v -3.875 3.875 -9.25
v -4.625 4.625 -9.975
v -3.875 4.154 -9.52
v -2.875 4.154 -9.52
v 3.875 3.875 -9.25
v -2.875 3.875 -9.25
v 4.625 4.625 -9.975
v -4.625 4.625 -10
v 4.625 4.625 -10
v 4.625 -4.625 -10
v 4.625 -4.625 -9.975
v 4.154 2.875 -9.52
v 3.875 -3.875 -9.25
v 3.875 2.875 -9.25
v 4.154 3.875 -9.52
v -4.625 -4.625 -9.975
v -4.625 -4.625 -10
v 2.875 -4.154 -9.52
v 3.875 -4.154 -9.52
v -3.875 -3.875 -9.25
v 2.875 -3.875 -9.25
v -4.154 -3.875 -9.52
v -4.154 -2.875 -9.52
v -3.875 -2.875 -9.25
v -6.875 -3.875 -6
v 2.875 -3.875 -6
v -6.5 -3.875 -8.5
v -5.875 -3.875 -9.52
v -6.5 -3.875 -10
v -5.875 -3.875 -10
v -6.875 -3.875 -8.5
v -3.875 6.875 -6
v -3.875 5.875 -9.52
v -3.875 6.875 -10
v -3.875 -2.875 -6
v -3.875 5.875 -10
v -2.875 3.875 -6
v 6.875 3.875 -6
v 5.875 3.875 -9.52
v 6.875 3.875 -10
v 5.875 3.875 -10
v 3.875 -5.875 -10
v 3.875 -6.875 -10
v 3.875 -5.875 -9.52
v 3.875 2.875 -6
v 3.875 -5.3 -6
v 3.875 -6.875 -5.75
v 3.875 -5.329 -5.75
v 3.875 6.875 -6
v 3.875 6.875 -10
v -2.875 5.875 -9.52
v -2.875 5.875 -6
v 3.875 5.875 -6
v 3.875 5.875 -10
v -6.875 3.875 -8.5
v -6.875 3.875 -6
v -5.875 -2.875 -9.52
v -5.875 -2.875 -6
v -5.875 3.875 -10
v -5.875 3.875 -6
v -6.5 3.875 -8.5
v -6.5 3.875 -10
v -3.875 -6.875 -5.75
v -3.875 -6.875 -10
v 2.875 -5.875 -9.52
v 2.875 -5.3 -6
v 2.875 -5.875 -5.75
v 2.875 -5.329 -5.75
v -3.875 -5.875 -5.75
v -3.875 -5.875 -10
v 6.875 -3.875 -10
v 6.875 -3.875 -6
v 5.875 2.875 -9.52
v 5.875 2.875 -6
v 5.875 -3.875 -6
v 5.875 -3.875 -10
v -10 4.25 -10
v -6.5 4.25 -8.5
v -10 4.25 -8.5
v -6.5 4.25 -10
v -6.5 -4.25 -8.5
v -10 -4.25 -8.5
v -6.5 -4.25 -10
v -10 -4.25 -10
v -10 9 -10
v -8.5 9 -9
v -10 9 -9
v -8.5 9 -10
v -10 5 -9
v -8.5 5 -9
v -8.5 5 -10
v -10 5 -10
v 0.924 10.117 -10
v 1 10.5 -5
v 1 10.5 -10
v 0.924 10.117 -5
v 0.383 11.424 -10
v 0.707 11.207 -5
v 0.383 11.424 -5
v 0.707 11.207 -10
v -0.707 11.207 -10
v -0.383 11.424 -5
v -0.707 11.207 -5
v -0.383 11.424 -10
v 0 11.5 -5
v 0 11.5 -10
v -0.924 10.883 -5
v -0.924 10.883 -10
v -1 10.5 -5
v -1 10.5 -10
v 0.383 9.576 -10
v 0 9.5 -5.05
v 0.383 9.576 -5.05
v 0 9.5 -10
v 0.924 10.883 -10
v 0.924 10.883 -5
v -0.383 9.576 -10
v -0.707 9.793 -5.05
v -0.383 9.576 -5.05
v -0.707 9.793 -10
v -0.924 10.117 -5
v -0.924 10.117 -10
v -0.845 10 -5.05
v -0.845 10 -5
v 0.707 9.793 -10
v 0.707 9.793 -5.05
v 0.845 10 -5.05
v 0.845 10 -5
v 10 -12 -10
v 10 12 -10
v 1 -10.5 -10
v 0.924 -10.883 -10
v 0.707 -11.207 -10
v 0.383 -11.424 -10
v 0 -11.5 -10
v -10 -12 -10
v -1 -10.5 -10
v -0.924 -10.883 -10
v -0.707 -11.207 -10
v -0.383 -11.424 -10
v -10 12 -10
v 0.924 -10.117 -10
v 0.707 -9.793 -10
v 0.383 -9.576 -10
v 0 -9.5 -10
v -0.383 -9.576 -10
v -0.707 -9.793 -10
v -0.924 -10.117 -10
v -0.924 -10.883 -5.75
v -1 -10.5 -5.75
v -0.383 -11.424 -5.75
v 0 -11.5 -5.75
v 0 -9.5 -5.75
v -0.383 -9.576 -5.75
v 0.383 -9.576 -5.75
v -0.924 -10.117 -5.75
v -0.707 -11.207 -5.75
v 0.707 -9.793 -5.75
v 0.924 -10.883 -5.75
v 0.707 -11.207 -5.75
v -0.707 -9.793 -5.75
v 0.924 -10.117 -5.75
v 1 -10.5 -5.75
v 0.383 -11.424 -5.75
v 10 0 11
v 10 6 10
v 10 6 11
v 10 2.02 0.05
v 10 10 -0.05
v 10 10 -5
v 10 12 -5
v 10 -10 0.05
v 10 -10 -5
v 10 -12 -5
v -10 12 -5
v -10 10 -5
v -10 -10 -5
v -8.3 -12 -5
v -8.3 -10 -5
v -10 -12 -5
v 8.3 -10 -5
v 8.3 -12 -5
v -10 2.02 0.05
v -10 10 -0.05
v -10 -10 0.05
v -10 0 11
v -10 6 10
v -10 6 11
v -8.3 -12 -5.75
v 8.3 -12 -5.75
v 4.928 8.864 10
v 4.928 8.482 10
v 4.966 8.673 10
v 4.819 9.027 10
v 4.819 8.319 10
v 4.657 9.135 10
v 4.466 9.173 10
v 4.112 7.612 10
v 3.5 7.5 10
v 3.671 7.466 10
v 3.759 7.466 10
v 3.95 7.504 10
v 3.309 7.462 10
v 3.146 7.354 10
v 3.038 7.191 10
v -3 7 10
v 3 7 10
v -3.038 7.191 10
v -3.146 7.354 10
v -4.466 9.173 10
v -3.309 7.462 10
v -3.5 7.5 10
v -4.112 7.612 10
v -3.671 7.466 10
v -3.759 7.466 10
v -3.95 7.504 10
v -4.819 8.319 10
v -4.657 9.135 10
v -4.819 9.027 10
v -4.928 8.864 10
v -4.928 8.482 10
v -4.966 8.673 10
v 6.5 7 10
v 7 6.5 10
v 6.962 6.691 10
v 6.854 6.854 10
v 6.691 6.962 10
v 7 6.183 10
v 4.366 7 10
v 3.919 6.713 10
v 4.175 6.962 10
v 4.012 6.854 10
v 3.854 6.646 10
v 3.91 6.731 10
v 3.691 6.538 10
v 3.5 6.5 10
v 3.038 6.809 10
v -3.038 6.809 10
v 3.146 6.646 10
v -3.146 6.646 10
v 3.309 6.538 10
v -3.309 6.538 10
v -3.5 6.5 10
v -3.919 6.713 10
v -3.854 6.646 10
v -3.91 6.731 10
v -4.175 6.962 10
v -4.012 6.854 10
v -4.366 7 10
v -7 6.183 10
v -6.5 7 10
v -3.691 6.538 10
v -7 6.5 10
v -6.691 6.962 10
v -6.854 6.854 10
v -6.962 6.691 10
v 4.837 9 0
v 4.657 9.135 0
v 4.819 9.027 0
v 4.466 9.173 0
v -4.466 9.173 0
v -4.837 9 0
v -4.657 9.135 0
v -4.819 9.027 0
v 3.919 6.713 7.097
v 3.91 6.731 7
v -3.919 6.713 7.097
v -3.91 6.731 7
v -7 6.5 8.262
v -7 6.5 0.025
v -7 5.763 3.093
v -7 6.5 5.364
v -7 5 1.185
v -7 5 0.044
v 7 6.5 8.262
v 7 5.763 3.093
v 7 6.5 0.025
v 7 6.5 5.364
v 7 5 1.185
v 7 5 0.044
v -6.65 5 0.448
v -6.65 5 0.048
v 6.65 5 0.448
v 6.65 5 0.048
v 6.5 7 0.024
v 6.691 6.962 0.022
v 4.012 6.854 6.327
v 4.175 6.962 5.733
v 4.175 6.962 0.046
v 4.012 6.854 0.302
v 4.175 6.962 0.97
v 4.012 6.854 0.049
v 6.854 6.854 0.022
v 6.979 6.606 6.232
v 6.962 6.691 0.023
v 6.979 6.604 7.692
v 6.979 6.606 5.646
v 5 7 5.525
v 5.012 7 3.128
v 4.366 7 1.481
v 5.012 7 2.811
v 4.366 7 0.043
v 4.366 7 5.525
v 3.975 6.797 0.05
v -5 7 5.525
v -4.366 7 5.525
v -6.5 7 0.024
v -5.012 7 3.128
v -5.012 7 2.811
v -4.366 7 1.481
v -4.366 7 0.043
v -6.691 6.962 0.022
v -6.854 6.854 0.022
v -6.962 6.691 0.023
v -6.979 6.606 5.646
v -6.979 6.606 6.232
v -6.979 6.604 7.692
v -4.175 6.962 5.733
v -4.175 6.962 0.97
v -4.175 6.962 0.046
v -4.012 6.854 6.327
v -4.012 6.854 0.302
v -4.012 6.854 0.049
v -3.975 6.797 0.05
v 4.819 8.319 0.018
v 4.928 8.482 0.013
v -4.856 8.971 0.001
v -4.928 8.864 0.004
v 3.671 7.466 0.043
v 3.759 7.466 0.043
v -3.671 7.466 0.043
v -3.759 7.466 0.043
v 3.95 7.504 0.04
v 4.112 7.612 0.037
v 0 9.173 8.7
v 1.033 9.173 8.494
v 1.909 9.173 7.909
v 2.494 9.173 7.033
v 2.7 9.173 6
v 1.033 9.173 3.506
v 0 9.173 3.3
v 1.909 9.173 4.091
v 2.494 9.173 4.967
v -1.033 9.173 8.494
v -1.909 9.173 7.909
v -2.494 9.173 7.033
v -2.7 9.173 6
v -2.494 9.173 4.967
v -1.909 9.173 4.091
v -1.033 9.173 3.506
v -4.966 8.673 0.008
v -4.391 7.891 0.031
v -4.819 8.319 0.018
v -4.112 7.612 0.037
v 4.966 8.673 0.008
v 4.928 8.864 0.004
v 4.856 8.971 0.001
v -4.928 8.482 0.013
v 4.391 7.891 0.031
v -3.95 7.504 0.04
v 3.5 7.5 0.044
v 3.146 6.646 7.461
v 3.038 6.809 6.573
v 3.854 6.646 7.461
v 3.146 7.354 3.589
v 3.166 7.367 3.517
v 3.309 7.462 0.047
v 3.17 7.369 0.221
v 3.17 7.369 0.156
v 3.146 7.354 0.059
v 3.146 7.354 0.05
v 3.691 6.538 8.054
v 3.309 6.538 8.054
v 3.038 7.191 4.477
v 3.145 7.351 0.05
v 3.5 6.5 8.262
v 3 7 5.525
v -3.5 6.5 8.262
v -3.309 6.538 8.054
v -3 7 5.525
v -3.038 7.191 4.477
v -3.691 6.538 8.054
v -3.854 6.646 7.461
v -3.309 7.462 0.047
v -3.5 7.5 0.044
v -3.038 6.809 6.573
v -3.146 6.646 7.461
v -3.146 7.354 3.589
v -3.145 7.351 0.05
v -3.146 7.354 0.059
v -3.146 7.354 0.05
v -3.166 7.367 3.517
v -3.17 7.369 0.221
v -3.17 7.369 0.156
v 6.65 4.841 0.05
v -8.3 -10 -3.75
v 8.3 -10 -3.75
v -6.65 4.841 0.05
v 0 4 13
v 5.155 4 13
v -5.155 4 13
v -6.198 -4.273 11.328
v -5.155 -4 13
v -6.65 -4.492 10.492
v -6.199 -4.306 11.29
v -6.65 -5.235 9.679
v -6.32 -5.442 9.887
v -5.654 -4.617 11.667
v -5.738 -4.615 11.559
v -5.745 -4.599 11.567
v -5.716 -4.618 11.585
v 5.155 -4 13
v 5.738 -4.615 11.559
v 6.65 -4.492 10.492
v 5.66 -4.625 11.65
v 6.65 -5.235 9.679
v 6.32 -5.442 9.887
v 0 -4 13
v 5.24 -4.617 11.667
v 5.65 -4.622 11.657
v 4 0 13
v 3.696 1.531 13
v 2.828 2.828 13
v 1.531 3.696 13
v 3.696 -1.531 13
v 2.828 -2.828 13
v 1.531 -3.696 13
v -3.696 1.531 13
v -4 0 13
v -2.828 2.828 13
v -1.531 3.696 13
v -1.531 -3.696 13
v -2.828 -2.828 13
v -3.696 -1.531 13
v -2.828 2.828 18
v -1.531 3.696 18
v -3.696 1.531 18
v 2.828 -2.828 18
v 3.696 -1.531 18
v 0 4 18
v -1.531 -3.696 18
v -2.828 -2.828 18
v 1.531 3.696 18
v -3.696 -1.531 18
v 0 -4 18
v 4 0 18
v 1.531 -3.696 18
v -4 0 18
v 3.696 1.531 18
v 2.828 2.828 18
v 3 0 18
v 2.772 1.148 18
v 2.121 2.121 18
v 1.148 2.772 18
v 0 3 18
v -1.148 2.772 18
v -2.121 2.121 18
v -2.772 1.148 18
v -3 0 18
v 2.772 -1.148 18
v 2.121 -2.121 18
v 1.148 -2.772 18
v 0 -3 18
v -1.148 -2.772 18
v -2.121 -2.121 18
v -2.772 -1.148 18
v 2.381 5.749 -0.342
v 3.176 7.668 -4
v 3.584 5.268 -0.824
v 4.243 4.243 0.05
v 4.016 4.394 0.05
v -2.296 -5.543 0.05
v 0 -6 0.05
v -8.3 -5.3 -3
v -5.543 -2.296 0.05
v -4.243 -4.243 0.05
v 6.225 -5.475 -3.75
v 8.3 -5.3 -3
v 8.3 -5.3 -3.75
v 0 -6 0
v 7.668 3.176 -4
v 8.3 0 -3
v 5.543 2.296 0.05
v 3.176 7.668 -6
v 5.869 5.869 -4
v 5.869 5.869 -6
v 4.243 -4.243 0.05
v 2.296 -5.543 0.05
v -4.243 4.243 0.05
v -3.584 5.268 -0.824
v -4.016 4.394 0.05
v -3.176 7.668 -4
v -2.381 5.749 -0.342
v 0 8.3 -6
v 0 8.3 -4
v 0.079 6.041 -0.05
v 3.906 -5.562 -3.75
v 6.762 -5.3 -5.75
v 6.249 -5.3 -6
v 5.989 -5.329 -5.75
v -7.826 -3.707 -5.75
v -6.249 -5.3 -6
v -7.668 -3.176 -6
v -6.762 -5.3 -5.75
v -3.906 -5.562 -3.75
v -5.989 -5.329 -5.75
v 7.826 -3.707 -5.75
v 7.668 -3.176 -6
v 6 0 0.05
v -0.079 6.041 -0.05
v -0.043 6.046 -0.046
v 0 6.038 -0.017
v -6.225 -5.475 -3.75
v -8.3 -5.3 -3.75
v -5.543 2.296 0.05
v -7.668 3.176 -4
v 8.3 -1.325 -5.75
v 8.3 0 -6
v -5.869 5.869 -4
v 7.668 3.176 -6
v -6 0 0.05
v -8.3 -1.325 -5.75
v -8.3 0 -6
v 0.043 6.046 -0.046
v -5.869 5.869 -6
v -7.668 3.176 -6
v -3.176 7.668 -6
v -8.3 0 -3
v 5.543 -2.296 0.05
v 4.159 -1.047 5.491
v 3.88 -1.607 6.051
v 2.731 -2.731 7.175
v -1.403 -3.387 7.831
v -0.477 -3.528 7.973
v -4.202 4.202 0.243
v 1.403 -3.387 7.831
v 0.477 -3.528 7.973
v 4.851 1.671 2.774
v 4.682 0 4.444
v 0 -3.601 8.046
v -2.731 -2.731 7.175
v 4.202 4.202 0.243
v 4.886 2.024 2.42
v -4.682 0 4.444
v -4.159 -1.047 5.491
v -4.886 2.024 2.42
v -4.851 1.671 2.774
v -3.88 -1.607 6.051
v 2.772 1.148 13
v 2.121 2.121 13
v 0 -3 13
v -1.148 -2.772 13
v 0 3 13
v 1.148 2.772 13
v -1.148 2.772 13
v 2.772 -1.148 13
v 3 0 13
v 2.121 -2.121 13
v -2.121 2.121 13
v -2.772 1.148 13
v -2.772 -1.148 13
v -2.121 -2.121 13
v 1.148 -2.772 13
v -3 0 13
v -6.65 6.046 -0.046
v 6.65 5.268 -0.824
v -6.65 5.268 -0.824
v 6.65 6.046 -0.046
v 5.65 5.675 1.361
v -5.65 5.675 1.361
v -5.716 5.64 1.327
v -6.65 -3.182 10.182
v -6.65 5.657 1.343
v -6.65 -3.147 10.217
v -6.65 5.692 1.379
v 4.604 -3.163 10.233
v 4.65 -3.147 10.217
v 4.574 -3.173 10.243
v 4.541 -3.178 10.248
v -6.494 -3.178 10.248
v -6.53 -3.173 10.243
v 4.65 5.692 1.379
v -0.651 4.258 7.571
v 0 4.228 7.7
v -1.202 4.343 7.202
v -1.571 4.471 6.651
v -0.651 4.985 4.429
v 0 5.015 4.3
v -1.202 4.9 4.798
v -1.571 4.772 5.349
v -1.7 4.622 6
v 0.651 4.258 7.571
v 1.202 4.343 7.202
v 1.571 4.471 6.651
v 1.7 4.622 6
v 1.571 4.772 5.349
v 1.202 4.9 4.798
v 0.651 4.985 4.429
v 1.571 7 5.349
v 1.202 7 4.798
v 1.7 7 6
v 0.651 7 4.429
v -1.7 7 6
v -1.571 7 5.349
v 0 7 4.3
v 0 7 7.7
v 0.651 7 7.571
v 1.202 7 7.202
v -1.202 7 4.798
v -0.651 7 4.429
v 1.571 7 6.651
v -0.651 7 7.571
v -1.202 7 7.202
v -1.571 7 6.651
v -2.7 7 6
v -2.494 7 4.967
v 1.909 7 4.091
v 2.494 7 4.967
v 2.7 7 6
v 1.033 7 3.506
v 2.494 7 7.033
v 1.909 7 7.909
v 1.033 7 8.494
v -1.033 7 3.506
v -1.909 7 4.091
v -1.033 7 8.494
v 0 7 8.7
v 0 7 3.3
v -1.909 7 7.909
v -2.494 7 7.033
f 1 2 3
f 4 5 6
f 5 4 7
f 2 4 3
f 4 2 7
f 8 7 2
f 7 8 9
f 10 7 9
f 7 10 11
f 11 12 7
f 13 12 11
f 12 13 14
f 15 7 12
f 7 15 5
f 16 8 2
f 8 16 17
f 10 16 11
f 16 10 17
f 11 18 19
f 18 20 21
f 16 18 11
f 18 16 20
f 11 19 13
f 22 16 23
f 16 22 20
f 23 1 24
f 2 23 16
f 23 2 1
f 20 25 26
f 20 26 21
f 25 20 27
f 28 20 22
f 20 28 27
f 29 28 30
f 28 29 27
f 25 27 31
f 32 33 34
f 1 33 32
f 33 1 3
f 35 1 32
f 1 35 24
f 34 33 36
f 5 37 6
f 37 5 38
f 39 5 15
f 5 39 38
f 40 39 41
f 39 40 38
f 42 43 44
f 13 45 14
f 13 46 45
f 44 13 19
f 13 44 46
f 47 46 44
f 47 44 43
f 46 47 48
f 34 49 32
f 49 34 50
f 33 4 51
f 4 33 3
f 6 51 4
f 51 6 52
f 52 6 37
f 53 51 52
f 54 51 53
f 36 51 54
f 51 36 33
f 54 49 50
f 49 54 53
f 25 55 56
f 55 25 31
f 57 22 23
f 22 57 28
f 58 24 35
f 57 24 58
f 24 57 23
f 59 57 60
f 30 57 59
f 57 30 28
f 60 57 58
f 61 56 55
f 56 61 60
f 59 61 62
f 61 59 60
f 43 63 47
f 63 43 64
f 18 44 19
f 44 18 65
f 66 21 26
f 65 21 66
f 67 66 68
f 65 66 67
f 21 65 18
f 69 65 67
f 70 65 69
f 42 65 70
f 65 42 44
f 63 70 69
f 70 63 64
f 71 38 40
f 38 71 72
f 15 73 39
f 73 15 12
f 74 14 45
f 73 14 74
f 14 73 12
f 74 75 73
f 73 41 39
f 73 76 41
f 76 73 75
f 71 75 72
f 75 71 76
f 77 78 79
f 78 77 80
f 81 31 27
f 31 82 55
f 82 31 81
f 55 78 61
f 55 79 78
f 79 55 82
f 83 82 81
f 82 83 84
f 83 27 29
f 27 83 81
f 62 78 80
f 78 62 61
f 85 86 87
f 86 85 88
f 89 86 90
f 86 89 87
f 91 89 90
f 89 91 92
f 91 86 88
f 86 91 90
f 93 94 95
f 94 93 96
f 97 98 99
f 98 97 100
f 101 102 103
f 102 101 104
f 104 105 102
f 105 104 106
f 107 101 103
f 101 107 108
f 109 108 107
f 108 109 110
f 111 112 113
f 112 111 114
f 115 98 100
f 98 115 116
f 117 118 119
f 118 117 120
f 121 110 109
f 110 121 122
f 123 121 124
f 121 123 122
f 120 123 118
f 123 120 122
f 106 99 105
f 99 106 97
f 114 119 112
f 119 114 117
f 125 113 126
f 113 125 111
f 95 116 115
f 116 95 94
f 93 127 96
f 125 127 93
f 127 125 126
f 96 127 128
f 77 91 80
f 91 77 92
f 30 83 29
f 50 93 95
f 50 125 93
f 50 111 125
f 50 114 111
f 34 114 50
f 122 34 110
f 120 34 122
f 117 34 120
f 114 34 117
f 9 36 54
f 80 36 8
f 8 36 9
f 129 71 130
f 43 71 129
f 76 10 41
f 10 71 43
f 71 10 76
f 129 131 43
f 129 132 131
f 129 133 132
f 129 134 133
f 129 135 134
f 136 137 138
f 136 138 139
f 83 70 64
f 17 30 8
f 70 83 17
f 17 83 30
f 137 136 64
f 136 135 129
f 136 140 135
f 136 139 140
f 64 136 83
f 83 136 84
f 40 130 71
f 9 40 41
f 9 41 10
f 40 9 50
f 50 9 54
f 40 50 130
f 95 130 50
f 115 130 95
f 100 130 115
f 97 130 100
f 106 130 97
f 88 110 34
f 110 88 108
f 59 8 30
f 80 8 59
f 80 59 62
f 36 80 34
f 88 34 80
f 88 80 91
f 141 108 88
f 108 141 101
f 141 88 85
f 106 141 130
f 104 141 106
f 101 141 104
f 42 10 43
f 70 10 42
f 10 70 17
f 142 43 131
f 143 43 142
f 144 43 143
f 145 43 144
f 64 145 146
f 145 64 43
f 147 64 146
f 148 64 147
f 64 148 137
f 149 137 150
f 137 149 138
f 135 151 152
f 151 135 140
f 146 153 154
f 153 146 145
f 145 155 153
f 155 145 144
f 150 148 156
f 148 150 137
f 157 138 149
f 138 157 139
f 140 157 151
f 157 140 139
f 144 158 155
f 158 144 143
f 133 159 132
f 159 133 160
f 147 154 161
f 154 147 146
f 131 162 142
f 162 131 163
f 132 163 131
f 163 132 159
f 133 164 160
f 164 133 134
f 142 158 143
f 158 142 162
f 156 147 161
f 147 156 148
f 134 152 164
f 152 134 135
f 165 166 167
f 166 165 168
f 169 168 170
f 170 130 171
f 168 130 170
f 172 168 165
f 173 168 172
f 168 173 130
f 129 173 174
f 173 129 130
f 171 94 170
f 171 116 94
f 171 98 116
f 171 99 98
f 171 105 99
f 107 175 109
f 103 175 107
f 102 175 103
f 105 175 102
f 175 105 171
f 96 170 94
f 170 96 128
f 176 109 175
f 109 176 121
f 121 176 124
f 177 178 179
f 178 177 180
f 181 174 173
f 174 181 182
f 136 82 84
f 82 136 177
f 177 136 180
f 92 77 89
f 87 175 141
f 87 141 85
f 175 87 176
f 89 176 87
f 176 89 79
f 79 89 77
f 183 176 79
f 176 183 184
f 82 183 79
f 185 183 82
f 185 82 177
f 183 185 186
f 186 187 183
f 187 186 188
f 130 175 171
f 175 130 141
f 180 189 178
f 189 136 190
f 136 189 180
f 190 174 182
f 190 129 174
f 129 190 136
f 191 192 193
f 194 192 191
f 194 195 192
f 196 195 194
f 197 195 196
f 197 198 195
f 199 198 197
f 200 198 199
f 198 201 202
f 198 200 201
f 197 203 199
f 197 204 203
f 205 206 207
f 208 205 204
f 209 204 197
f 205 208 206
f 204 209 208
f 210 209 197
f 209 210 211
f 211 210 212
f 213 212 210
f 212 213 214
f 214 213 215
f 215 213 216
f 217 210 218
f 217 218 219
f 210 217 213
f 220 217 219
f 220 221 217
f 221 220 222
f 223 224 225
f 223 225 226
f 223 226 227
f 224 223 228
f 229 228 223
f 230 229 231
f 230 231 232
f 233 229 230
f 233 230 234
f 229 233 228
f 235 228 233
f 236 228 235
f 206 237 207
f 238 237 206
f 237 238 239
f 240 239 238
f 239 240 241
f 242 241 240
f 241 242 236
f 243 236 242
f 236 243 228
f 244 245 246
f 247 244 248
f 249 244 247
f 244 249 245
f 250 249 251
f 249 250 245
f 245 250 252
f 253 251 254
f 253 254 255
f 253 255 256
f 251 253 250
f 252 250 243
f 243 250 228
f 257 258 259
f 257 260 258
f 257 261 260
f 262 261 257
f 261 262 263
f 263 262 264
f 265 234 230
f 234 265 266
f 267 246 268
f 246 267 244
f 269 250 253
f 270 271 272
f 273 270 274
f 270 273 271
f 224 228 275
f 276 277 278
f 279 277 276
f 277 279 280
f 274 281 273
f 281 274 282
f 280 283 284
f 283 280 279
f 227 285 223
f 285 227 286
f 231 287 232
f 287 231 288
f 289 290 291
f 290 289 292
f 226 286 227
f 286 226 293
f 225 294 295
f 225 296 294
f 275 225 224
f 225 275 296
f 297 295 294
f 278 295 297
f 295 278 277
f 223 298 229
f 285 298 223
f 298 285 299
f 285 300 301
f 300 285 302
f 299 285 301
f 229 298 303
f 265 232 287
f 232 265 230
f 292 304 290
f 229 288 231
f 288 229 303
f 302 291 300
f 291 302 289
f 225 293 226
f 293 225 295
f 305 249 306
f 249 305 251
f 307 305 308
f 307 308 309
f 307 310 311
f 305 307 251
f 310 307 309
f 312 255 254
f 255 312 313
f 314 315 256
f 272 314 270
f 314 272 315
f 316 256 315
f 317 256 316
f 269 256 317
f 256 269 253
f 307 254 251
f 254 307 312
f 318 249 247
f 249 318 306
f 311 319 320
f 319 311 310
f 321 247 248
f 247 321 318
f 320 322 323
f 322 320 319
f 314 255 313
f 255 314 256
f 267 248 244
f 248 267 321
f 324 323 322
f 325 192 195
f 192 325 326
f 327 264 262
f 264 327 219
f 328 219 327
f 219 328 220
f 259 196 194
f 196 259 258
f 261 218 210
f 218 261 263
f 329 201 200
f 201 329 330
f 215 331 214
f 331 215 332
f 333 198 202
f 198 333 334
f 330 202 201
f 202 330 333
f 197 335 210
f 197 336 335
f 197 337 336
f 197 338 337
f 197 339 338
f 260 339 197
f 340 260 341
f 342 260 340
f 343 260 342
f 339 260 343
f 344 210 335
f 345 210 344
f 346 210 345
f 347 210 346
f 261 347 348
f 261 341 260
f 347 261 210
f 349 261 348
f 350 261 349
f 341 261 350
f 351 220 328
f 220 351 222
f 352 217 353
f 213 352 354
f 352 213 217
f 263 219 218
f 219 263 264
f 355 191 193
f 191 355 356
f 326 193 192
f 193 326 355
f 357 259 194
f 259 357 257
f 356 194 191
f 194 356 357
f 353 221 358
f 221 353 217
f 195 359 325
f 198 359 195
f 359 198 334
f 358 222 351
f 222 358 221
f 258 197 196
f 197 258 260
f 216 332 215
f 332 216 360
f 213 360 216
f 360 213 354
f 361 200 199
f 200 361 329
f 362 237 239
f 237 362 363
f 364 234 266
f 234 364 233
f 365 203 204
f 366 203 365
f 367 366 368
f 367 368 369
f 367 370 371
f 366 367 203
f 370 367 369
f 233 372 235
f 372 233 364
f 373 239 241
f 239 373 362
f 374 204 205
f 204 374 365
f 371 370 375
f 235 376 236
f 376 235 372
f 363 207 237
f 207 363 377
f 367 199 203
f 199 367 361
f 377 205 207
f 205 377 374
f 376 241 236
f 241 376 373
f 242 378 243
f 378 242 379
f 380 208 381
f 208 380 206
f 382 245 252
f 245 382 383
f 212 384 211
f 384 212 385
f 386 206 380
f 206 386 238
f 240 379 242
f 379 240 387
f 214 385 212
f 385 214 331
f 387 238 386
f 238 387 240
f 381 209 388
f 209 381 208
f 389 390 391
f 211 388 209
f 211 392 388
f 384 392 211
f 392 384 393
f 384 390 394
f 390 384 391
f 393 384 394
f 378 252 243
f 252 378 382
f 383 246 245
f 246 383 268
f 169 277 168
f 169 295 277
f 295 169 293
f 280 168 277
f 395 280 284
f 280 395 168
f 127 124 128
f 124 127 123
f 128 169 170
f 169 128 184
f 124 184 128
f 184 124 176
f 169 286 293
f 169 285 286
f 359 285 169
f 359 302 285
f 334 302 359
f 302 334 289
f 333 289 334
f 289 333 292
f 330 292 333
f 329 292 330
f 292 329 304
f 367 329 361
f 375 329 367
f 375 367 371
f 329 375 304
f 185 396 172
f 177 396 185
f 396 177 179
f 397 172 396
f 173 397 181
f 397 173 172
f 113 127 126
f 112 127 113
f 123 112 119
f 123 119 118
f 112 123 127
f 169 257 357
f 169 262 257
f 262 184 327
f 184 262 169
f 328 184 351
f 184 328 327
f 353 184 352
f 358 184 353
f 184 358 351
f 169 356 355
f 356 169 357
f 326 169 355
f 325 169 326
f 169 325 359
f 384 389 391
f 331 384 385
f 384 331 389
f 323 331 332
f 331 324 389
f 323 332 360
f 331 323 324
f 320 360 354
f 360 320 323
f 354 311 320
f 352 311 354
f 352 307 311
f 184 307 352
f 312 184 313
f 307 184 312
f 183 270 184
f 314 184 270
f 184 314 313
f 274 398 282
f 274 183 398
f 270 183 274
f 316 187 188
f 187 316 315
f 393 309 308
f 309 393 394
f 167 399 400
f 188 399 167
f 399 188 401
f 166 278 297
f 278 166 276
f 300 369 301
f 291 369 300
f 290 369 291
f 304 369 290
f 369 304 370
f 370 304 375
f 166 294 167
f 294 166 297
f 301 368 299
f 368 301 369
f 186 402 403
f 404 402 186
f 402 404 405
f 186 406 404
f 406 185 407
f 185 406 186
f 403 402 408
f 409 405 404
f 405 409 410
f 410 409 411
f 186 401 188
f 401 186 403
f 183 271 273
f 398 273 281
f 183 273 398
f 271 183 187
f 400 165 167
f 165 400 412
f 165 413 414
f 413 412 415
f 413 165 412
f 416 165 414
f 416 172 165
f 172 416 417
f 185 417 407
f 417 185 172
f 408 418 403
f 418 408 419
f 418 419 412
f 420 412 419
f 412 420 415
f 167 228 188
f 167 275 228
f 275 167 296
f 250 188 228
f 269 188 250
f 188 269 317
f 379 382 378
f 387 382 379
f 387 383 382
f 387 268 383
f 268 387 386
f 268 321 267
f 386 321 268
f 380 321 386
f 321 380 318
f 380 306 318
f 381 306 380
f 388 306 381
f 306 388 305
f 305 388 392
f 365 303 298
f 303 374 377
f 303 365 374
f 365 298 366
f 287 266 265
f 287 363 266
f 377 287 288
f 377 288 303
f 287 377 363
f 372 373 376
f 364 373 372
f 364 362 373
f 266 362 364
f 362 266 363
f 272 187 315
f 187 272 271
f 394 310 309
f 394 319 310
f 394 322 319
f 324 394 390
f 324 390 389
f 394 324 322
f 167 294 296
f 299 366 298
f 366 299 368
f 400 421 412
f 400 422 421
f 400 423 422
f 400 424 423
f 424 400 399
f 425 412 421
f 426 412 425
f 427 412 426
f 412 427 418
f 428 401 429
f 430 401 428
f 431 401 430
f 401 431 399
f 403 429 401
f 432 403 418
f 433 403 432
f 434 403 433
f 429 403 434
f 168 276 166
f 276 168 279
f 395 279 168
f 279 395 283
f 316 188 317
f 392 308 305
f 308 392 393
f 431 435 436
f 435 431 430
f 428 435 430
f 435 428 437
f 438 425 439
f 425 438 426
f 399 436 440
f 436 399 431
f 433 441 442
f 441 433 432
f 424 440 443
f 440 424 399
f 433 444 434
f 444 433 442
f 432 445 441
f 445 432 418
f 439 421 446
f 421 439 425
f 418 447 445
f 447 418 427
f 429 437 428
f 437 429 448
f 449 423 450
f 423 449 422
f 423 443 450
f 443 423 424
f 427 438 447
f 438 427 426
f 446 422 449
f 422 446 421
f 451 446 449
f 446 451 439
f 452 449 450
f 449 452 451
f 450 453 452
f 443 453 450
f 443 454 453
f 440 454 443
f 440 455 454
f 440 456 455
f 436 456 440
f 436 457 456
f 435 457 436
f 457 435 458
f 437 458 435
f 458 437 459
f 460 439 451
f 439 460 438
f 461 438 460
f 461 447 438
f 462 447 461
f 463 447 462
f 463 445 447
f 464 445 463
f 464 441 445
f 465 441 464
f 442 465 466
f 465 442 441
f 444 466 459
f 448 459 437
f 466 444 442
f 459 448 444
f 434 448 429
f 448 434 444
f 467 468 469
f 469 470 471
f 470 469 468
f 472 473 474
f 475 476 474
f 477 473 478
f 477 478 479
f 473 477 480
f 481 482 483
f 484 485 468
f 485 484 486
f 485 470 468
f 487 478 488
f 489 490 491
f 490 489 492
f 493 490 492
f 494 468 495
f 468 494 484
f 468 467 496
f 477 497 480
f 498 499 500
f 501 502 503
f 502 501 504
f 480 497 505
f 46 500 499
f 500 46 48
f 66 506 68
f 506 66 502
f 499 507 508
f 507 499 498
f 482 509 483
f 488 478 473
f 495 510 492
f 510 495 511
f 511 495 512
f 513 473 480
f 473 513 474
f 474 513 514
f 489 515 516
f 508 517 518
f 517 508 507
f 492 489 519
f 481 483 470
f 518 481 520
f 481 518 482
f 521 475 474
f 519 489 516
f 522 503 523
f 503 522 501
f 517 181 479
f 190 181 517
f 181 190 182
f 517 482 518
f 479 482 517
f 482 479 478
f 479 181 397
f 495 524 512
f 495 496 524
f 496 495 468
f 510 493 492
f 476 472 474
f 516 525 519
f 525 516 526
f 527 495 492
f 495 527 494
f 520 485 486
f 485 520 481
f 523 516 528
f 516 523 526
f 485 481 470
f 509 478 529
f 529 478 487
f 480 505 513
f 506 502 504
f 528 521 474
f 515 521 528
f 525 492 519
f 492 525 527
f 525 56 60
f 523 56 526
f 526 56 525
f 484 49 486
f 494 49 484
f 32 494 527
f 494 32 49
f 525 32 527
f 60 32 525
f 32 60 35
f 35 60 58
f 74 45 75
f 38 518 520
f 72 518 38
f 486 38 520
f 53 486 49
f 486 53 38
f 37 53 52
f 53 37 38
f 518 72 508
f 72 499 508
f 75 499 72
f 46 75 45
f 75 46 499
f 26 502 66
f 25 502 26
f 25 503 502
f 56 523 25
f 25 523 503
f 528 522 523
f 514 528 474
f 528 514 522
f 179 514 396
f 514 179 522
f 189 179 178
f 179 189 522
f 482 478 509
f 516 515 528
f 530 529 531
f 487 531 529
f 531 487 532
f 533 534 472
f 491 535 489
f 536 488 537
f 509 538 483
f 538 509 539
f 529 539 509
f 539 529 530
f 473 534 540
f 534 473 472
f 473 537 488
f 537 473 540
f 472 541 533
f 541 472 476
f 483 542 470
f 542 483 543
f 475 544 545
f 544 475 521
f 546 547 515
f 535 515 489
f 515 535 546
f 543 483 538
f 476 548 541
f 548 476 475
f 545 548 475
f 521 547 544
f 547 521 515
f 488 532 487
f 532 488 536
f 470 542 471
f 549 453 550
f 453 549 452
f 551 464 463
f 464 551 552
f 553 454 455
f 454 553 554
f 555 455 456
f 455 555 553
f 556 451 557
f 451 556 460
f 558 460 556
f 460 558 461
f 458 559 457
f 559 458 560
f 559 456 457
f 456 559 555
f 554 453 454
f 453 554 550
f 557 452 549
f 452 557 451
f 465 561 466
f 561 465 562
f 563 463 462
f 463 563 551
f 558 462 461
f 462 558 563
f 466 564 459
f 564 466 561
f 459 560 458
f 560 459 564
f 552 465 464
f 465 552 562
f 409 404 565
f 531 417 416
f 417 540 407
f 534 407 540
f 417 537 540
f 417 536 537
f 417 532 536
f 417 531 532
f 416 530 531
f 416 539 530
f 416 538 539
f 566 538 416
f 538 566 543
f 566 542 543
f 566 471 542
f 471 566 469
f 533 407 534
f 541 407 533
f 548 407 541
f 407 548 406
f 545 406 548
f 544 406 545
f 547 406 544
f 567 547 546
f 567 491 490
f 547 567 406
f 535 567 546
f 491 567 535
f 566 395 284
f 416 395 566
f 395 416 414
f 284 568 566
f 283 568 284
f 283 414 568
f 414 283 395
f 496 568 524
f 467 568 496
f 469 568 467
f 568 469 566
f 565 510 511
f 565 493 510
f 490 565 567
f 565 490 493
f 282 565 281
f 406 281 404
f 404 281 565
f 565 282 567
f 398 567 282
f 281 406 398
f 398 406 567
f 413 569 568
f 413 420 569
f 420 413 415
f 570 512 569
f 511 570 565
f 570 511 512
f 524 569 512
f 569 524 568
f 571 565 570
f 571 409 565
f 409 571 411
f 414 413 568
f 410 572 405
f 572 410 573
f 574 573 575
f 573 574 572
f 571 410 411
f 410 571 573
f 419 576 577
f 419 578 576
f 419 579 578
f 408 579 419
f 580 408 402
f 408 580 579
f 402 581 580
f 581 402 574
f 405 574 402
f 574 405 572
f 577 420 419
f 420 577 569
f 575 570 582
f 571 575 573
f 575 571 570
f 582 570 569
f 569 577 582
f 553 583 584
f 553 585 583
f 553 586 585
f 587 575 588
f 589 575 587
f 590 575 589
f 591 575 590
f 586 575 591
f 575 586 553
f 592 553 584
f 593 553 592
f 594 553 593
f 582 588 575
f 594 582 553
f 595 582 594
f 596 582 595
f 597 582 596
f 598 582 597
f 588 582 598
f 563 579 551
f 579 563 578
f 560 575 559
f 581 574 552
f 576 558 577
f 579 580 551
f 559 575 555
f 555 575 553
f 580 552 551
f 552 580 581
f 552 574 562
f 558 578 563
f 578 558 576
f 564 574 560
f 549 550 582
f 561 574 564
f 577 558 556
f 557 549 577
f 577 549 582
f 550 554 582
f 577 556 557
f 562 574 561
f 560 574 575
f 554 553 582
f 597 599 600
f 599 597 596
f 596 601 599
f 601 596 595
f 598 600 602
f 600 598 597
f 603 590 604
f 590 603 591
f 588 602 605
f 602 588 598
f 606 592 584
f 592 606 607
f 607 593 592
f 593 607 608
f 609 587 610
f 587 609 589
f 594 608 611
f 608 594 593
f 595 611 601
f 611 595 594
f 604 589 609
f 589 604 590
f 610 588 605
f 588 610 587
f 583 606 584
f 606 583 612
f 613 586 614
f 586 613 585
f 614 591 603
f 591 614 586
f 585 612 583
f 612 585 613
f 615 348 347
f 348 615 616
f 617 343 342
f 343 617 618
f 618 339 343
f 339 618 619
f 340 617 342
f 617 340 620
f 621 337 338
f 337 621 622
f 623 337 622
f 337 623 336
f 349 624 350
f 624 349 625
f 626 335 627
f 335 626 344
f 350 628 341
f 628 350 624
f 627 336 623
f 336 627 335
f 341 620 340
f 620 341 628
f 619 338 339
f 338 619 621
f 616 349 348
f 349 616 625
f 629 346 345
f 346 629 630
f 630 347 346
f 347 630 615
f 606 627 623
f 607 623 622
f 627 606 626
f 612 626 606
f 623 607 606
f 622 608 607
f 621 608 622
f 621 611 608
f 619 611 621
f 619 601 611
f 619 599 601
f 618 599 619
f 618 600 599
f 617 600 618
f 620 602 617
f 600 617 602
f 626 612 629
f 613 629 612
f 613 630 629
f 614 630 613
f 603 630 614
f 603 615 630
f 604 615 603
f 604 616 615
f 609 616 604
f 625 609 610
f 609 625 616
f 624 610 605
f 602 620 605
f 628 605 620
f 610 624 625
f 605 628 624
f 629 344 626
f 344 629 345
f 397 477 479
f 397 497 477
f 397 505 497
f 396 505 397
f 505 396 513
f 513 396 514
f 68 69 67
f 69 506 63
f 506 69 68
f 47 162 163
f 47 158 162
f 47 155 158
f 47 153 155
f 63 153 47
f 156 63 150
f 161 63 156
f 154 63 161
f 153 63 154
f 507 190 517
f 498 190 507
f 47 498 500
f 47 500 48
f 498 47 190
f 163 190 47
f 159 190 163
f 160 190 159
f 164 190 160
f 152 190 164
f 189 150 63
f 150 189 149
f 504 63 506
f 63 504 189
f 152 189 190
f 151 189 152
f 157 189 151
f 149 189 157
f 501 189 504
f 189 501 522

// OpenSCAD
// file: picam_push_fit.scad
use <utilities.scad>;


//outer_r=8.5;   //square side length
//f=0.5; //feather amount
d=0.05; //small distance!


module camera_bits(){
	union(){
		translate([0,6.5+5,0]) cube([8.5,10,3],center=true);
		translate([7,10,0]) cube([4,3,2],center=true);
	}
}

module picam_push_fit(){
    // This uses four slightly flexible fingers to grip the
    // camera module.  It's designed to be subtracted from a
    // larger shape, and needs space above it.
    // it's often a bit too stiff, and tends to rotate the
    // camera slightly.  v2 is better (see below).
	assign(r=8-0.25) //un-flexed side length of camera box
	assign(finger_w=2) //width of flexure "fingers"
	assign(chamfer=0.75) //How much to shrink the bottom layer
	union(){
		//very tight cut-out for camera
		sequential_hull(){
			cube([r+chamfer*2,r+chamfer*2,d],center=true);
			cube([r,r,chamfer*2],center=true);
			cube([r,r,40],center=true);
		}
		for(a=[0:90:360]) rotate(a){
			translate([0,r/2-1,0.48]) cube([r/2+finger_w+1,1,20]);
			translate([r/2+finger_w,-r/2,-d]) cube([1,r,20]);
		}
		camera_bits();

		//screw holes for safety (M2 "threaded")
		reflect([1,0,0]) translate([21/2,0,0]) cylinder(r=1,h=10);
	}
}



module picam_push_fit_2( beam_length=15){
    // This module is designed to be subtracted from the bottom of a shape.
    // The z=0 plane should be the print bed.
    // It includes cut-outs for the components on the PCB and also a push-fit hole
    // for the camera module.  This uses flexible "fingers" to grip the camera firmly
    // but gently.  Just push to insert, and wiggle to remove.  You may find popping 
    // off the brown ribbon cable and removing the PCB first helps when extracting
    // the camera module again.
    camera = [8,8,3]; //size of camera box
	cw = camera[0]+1; //side length of camera box at bottom (slightly larger)
	finger_w = 1.5; //width of flexure "fingers"
	flex_l = 1; //width of flexible part
    hole_r = camera[0]/2-0.5;
	union(){
		//cut-out for camera
        hull(){
            translate([0,0,-d]) cube([cw+0.5,cw+0.5,d],center=true); //hole for camera
            translate([0,0,1]) cube([cw-0.5,cw-0.5,d],center=true); //hole for camera
        }
        rotate(180/16) cylinder(r=hole_r,h=20,center=true,$fn=16); //hole for light
        
        //looser cut-out for camera, with gripping "fingers" on 3 sides
        difference(){
            //cut-out big enough to include gripping fingers
            intersection(){
                translate([-cw/2-finger_w-flex_l,-cw/2-finger_w-flex_l,0.5])
                    cube([cw+2*finger_w+2*flex_l,
                        cw+finger_w+flex_l,
                        999]);
                //build up the roof gradually so we get a nice hole
                rotate(90) translate([0,0,camera[2]+1.5]) hole_from_bottom(r=hole_r,base_w=cw+2*finger_w+2*flex_l,h=beam_length - camera[2]-1.5);
            }
                
            //gripping "fingers" (NB we subtract these from the cut-out)
            for(a=[90:90:270]) rotate(a) hull(){
                translate([-cw/2+0.5,cw/2,0]) cube([cw-1,finger_w,d]);
                translate([-cw/2+1,camera[0]/2-0.1,camera[2]]) cube([cw-2,finger_w,d]);
            }
            //there's no finger on the top, so add a dimple on the fourth side
            hull(){
                translate([-cw/2+1,cw/2,2]) cube([cw-2,d,camera[2]-2]);
                translate([-cw/2+2,camera[1]/2,camera[2]-0.5]) cube([cw-4,d,0.5]);
            }
		}
        
		//ribbon cable at top of camera
        translate([0,(9.5+5)/2+cw/2-d,0]) cube([cw,9.5+5,4],center=true);
        //resistor/LED
		translate([7,10,0]) cube([4+2,3,2],center=true);
        translate([7+1,8.5,0.3]) cube([1,13,1]); //channel so we can see the LED
                //NB the LED channel is deliberately high to aid adhesion

		//screw holes for safety (M2 "threaded")
		reflect([1,0,0]) translate([21/2,0,0]) cylinder(r=1,h=10,center=true);
	}
}

//difference(){
//    translate([-12.5,-12+2.4,0]) cube([25,24,6]);
//    picam_push_fit_2();
//}

module picam_pcb_bottom(){
    // This is an approximate model of the pi camera PCB for the purposes of making
    // a slide-on cover.  NB z=0 is the bottom of the PCB, which is nominally 1mm thick.
    pcb = [25+0.5,24+0.5,1+0.3];
    socket = [pcb[0],6.0+0.5,2.7];
    components = [pcb[0]-3*2, pcb[1]-1-socket[1], 2];
    translate([0,2.4,0]) union(){ //NB the camera bit isn't centred!
        translate([0,0,pcb[2]/2]) cube(pcb,center=true); //the PCB
        translate([-components[0]/2,-pcb[1]/2+socket[1],-components[2]+d]) cube(components); //the little components
        //the ribbon cable socket
        translate([-socket[0]/2,-pcb[1]/2,-socket[2]+d]) cube(socket); //the ribbon cable socket
        translate([-components[0]/2,-pcb[1]/2,-0.5]) cube([components[0],socket[1]+0.5,0.5+d]); //pins protrude slightly further
        
        //mounting screws (NB could be extruded in -y so the cover can slide on)
        reflect([1,0,0]) mirror([0,0,1]) translate([21/2,-2.4,-d]){
            cylinder(r=2.5,h=10);
            cylinder(r=1.5,h=15,center=true); //screw might poke through the top...
        }
    }
}
translate([0,0,-1]) picam_pcb_bottom();
// main file
/******************************************************************
*                                                                 *
* OpenFlexure Microscope: [OLD] camera mount incl. fluorescence   *
*                                                                 *
* This is part of the OpenFlexure microscope, an open-source      *
* microscope and 3-axis translation stage.  It gets really good   *
* precision over a ~10mm range, by using plastic flexure          *
* mechanisms.                                                     *
*                                                                 *
* (c) Richard Bowman, January 2016                                *
* Released under the CERN Open Hardware License                   *
*                                                                 *
******************************************************************/

use <utilities.scad>;
use <./picam_push_fit.scad>;
$fn=16;
d=0.05;

clip_y = 7;
clip_w = 14; //external width of clip for dovetail
clip_h = 10; //height of dovetail
tube_h = 8; //height of tube that meshes with objective
beam_r = 3; //radius of beam (must be > camera diagonal/2)
bottom = -10;
led_z = 6; //height of LED beam path
filter_r = 16/2+0.3; //radius of circular filters
dichroic = [12.5+0.8,16,1.1]; //size of filter cube

//the dovetail should sit at ([0,-leg_r-2,sample_z+5])
//the LED should sit at ([0,0,sample_z+30])
module clip_tooth(h){
	intersection(){
		cube([999,999,h]);
		rotate(-45) cube([1,1,1]*999*2);
	}
}
module dovetail(w=10,dt=1.5,h=10,t=2){
	assign(r=0.5,corner=[w/2-dt,0,0]) difference(){
		union(){
			sequential_hull(){
				translate([-w/2+dt,r,0]) cube([w-2*dt,d,h]);
				translate([-w/2+dt-r,-r,0]) cube([w-2*dt+2*r,d,h]);
				translate([-w/2,-r,0]) cube([w,d,h]);
				translate([-w/2-t,-t,0]) cube([w+2*t,t-r,h]);
				echo("width of dovetail back is", w-2*dt+2*(sqrt(3)*r+1+r));
			}
			difference(){
				union(){
					reflect([1,0,0]) hull(){
						translate(corner+[sqrt(3)*r,-r,0]) cylinder(r=r,h=h);	
						translate([w/2+t-r,-r,0]) cylinder(r=r,h=h);	
				}
					hull() reflect([1,0,0]) translate(corner) rotate(45) translate([sqrt(3)*r,r,0]) repeat([1,0,0],2) cylinder(r=r,h=h);
				}
			}
		}
		reflect([1,0,0]) translate(corner) cylinder(r=r,h=3*h,center=true);
		reflect([1,0,0]) translate(corner+[0,0,-1]) clip_tooth(999);
	}
}

module picam_mount(){
	union(){
		difference(){ //barrel/body
			union(){
				difference(){ //camera mount at bottom
					translate([-10,-12,bottom]) cube([20,24,5]);
					translate([0,0,bottom ]) rotate(90) picam_push_fit();
				}
				translate([0,clip_y,0]) dovetail(w=clip_w-4,h=clip_h); //dovetail
				sequential_hull(){ //body
					translate([-10,-10,bottom+5-d]) cube([20,20,-bottom-5]);
					union(){
						translate([-20/2,-20/2,0]) cube([20,20-clip_y-1,d]);
						cylinder(r=8,h=d);
					}
					translate([0,0,clip_h]) union(){
						translate([-20/2,0,0]) cube([20,clip_y-1,1]);
						cylinder(r=beam_r+1,h=3);
						cube([dichroic[0]*0.7+1,2*beam_r+2,6],center=true);
					}
					translate([0,0,clip_h]) cylinder(r=beam_r+1,h=d);
					translate([0,0,clip_h]) cylinder(r=beam_r+1,h=tube_h);
				}
			}
			union(){
				sequential_hull(){ //original clearance for beam
					intersection(){
						union(){
							translate([0,0,bottom+5-1]) cylinder(r=filter_r,h=2);
							translate([-filter_r,-filter_r,bottom+5]) cube([filter_r*2,filter_r,2]);
						}
						translate([0,3,0]) cube([filter_r,filter_r,999]*2,center=true);
					}
					cylinder(r=6,h=d);
					cylinder(r=beam_r,h=clip_h+d);
					cylinder(r=beam_r,h=clip_h+tube_h+d);
				}
				//dichroic
				mirror([0,1,0]) sequential_hull(){
#					translate([0,0,led_z-dichroic[2]/sqrt(2)]) rotate([45,0,0]) cube(dichroic,center=true);
					translate([0,0,led_z+1]) rotate([45,0,0]) cube([dichroic[0]-2,dichroic[1],d],center=true);
					translate([0,0,led_z+1]) rotate([45,0,0]) translate([-dichroic[0]/2,-dichroic[1]/2,0]) cube([dichroic[0]-2,dichroic[1]/2+beam_r+1.5,d]);
					translate([0,0,clip_h]) cylinder(r=beam_r,h=3);
				}
				//LED beam
#				translate([0,0,led_z]) rotate([-90,0,0]) cylinder(r=3/2+0.2,h=999);
#				translate([0,7,led_z]) rotate([-90,0,0]) cylinder(r=5/2+0.2,h=999);
				//Emission filter entry slot
				translate([-filter_r,-999,bottom+5-1+0.25]) cube([2*filter_r,999,2]);
//#				translate([0,-4,led_z+5]) rotate([90,0,0]) cylinder(r=16/2+0.2,h=1.3,center=true);
			}
		}
	}
}

picam_mount();
